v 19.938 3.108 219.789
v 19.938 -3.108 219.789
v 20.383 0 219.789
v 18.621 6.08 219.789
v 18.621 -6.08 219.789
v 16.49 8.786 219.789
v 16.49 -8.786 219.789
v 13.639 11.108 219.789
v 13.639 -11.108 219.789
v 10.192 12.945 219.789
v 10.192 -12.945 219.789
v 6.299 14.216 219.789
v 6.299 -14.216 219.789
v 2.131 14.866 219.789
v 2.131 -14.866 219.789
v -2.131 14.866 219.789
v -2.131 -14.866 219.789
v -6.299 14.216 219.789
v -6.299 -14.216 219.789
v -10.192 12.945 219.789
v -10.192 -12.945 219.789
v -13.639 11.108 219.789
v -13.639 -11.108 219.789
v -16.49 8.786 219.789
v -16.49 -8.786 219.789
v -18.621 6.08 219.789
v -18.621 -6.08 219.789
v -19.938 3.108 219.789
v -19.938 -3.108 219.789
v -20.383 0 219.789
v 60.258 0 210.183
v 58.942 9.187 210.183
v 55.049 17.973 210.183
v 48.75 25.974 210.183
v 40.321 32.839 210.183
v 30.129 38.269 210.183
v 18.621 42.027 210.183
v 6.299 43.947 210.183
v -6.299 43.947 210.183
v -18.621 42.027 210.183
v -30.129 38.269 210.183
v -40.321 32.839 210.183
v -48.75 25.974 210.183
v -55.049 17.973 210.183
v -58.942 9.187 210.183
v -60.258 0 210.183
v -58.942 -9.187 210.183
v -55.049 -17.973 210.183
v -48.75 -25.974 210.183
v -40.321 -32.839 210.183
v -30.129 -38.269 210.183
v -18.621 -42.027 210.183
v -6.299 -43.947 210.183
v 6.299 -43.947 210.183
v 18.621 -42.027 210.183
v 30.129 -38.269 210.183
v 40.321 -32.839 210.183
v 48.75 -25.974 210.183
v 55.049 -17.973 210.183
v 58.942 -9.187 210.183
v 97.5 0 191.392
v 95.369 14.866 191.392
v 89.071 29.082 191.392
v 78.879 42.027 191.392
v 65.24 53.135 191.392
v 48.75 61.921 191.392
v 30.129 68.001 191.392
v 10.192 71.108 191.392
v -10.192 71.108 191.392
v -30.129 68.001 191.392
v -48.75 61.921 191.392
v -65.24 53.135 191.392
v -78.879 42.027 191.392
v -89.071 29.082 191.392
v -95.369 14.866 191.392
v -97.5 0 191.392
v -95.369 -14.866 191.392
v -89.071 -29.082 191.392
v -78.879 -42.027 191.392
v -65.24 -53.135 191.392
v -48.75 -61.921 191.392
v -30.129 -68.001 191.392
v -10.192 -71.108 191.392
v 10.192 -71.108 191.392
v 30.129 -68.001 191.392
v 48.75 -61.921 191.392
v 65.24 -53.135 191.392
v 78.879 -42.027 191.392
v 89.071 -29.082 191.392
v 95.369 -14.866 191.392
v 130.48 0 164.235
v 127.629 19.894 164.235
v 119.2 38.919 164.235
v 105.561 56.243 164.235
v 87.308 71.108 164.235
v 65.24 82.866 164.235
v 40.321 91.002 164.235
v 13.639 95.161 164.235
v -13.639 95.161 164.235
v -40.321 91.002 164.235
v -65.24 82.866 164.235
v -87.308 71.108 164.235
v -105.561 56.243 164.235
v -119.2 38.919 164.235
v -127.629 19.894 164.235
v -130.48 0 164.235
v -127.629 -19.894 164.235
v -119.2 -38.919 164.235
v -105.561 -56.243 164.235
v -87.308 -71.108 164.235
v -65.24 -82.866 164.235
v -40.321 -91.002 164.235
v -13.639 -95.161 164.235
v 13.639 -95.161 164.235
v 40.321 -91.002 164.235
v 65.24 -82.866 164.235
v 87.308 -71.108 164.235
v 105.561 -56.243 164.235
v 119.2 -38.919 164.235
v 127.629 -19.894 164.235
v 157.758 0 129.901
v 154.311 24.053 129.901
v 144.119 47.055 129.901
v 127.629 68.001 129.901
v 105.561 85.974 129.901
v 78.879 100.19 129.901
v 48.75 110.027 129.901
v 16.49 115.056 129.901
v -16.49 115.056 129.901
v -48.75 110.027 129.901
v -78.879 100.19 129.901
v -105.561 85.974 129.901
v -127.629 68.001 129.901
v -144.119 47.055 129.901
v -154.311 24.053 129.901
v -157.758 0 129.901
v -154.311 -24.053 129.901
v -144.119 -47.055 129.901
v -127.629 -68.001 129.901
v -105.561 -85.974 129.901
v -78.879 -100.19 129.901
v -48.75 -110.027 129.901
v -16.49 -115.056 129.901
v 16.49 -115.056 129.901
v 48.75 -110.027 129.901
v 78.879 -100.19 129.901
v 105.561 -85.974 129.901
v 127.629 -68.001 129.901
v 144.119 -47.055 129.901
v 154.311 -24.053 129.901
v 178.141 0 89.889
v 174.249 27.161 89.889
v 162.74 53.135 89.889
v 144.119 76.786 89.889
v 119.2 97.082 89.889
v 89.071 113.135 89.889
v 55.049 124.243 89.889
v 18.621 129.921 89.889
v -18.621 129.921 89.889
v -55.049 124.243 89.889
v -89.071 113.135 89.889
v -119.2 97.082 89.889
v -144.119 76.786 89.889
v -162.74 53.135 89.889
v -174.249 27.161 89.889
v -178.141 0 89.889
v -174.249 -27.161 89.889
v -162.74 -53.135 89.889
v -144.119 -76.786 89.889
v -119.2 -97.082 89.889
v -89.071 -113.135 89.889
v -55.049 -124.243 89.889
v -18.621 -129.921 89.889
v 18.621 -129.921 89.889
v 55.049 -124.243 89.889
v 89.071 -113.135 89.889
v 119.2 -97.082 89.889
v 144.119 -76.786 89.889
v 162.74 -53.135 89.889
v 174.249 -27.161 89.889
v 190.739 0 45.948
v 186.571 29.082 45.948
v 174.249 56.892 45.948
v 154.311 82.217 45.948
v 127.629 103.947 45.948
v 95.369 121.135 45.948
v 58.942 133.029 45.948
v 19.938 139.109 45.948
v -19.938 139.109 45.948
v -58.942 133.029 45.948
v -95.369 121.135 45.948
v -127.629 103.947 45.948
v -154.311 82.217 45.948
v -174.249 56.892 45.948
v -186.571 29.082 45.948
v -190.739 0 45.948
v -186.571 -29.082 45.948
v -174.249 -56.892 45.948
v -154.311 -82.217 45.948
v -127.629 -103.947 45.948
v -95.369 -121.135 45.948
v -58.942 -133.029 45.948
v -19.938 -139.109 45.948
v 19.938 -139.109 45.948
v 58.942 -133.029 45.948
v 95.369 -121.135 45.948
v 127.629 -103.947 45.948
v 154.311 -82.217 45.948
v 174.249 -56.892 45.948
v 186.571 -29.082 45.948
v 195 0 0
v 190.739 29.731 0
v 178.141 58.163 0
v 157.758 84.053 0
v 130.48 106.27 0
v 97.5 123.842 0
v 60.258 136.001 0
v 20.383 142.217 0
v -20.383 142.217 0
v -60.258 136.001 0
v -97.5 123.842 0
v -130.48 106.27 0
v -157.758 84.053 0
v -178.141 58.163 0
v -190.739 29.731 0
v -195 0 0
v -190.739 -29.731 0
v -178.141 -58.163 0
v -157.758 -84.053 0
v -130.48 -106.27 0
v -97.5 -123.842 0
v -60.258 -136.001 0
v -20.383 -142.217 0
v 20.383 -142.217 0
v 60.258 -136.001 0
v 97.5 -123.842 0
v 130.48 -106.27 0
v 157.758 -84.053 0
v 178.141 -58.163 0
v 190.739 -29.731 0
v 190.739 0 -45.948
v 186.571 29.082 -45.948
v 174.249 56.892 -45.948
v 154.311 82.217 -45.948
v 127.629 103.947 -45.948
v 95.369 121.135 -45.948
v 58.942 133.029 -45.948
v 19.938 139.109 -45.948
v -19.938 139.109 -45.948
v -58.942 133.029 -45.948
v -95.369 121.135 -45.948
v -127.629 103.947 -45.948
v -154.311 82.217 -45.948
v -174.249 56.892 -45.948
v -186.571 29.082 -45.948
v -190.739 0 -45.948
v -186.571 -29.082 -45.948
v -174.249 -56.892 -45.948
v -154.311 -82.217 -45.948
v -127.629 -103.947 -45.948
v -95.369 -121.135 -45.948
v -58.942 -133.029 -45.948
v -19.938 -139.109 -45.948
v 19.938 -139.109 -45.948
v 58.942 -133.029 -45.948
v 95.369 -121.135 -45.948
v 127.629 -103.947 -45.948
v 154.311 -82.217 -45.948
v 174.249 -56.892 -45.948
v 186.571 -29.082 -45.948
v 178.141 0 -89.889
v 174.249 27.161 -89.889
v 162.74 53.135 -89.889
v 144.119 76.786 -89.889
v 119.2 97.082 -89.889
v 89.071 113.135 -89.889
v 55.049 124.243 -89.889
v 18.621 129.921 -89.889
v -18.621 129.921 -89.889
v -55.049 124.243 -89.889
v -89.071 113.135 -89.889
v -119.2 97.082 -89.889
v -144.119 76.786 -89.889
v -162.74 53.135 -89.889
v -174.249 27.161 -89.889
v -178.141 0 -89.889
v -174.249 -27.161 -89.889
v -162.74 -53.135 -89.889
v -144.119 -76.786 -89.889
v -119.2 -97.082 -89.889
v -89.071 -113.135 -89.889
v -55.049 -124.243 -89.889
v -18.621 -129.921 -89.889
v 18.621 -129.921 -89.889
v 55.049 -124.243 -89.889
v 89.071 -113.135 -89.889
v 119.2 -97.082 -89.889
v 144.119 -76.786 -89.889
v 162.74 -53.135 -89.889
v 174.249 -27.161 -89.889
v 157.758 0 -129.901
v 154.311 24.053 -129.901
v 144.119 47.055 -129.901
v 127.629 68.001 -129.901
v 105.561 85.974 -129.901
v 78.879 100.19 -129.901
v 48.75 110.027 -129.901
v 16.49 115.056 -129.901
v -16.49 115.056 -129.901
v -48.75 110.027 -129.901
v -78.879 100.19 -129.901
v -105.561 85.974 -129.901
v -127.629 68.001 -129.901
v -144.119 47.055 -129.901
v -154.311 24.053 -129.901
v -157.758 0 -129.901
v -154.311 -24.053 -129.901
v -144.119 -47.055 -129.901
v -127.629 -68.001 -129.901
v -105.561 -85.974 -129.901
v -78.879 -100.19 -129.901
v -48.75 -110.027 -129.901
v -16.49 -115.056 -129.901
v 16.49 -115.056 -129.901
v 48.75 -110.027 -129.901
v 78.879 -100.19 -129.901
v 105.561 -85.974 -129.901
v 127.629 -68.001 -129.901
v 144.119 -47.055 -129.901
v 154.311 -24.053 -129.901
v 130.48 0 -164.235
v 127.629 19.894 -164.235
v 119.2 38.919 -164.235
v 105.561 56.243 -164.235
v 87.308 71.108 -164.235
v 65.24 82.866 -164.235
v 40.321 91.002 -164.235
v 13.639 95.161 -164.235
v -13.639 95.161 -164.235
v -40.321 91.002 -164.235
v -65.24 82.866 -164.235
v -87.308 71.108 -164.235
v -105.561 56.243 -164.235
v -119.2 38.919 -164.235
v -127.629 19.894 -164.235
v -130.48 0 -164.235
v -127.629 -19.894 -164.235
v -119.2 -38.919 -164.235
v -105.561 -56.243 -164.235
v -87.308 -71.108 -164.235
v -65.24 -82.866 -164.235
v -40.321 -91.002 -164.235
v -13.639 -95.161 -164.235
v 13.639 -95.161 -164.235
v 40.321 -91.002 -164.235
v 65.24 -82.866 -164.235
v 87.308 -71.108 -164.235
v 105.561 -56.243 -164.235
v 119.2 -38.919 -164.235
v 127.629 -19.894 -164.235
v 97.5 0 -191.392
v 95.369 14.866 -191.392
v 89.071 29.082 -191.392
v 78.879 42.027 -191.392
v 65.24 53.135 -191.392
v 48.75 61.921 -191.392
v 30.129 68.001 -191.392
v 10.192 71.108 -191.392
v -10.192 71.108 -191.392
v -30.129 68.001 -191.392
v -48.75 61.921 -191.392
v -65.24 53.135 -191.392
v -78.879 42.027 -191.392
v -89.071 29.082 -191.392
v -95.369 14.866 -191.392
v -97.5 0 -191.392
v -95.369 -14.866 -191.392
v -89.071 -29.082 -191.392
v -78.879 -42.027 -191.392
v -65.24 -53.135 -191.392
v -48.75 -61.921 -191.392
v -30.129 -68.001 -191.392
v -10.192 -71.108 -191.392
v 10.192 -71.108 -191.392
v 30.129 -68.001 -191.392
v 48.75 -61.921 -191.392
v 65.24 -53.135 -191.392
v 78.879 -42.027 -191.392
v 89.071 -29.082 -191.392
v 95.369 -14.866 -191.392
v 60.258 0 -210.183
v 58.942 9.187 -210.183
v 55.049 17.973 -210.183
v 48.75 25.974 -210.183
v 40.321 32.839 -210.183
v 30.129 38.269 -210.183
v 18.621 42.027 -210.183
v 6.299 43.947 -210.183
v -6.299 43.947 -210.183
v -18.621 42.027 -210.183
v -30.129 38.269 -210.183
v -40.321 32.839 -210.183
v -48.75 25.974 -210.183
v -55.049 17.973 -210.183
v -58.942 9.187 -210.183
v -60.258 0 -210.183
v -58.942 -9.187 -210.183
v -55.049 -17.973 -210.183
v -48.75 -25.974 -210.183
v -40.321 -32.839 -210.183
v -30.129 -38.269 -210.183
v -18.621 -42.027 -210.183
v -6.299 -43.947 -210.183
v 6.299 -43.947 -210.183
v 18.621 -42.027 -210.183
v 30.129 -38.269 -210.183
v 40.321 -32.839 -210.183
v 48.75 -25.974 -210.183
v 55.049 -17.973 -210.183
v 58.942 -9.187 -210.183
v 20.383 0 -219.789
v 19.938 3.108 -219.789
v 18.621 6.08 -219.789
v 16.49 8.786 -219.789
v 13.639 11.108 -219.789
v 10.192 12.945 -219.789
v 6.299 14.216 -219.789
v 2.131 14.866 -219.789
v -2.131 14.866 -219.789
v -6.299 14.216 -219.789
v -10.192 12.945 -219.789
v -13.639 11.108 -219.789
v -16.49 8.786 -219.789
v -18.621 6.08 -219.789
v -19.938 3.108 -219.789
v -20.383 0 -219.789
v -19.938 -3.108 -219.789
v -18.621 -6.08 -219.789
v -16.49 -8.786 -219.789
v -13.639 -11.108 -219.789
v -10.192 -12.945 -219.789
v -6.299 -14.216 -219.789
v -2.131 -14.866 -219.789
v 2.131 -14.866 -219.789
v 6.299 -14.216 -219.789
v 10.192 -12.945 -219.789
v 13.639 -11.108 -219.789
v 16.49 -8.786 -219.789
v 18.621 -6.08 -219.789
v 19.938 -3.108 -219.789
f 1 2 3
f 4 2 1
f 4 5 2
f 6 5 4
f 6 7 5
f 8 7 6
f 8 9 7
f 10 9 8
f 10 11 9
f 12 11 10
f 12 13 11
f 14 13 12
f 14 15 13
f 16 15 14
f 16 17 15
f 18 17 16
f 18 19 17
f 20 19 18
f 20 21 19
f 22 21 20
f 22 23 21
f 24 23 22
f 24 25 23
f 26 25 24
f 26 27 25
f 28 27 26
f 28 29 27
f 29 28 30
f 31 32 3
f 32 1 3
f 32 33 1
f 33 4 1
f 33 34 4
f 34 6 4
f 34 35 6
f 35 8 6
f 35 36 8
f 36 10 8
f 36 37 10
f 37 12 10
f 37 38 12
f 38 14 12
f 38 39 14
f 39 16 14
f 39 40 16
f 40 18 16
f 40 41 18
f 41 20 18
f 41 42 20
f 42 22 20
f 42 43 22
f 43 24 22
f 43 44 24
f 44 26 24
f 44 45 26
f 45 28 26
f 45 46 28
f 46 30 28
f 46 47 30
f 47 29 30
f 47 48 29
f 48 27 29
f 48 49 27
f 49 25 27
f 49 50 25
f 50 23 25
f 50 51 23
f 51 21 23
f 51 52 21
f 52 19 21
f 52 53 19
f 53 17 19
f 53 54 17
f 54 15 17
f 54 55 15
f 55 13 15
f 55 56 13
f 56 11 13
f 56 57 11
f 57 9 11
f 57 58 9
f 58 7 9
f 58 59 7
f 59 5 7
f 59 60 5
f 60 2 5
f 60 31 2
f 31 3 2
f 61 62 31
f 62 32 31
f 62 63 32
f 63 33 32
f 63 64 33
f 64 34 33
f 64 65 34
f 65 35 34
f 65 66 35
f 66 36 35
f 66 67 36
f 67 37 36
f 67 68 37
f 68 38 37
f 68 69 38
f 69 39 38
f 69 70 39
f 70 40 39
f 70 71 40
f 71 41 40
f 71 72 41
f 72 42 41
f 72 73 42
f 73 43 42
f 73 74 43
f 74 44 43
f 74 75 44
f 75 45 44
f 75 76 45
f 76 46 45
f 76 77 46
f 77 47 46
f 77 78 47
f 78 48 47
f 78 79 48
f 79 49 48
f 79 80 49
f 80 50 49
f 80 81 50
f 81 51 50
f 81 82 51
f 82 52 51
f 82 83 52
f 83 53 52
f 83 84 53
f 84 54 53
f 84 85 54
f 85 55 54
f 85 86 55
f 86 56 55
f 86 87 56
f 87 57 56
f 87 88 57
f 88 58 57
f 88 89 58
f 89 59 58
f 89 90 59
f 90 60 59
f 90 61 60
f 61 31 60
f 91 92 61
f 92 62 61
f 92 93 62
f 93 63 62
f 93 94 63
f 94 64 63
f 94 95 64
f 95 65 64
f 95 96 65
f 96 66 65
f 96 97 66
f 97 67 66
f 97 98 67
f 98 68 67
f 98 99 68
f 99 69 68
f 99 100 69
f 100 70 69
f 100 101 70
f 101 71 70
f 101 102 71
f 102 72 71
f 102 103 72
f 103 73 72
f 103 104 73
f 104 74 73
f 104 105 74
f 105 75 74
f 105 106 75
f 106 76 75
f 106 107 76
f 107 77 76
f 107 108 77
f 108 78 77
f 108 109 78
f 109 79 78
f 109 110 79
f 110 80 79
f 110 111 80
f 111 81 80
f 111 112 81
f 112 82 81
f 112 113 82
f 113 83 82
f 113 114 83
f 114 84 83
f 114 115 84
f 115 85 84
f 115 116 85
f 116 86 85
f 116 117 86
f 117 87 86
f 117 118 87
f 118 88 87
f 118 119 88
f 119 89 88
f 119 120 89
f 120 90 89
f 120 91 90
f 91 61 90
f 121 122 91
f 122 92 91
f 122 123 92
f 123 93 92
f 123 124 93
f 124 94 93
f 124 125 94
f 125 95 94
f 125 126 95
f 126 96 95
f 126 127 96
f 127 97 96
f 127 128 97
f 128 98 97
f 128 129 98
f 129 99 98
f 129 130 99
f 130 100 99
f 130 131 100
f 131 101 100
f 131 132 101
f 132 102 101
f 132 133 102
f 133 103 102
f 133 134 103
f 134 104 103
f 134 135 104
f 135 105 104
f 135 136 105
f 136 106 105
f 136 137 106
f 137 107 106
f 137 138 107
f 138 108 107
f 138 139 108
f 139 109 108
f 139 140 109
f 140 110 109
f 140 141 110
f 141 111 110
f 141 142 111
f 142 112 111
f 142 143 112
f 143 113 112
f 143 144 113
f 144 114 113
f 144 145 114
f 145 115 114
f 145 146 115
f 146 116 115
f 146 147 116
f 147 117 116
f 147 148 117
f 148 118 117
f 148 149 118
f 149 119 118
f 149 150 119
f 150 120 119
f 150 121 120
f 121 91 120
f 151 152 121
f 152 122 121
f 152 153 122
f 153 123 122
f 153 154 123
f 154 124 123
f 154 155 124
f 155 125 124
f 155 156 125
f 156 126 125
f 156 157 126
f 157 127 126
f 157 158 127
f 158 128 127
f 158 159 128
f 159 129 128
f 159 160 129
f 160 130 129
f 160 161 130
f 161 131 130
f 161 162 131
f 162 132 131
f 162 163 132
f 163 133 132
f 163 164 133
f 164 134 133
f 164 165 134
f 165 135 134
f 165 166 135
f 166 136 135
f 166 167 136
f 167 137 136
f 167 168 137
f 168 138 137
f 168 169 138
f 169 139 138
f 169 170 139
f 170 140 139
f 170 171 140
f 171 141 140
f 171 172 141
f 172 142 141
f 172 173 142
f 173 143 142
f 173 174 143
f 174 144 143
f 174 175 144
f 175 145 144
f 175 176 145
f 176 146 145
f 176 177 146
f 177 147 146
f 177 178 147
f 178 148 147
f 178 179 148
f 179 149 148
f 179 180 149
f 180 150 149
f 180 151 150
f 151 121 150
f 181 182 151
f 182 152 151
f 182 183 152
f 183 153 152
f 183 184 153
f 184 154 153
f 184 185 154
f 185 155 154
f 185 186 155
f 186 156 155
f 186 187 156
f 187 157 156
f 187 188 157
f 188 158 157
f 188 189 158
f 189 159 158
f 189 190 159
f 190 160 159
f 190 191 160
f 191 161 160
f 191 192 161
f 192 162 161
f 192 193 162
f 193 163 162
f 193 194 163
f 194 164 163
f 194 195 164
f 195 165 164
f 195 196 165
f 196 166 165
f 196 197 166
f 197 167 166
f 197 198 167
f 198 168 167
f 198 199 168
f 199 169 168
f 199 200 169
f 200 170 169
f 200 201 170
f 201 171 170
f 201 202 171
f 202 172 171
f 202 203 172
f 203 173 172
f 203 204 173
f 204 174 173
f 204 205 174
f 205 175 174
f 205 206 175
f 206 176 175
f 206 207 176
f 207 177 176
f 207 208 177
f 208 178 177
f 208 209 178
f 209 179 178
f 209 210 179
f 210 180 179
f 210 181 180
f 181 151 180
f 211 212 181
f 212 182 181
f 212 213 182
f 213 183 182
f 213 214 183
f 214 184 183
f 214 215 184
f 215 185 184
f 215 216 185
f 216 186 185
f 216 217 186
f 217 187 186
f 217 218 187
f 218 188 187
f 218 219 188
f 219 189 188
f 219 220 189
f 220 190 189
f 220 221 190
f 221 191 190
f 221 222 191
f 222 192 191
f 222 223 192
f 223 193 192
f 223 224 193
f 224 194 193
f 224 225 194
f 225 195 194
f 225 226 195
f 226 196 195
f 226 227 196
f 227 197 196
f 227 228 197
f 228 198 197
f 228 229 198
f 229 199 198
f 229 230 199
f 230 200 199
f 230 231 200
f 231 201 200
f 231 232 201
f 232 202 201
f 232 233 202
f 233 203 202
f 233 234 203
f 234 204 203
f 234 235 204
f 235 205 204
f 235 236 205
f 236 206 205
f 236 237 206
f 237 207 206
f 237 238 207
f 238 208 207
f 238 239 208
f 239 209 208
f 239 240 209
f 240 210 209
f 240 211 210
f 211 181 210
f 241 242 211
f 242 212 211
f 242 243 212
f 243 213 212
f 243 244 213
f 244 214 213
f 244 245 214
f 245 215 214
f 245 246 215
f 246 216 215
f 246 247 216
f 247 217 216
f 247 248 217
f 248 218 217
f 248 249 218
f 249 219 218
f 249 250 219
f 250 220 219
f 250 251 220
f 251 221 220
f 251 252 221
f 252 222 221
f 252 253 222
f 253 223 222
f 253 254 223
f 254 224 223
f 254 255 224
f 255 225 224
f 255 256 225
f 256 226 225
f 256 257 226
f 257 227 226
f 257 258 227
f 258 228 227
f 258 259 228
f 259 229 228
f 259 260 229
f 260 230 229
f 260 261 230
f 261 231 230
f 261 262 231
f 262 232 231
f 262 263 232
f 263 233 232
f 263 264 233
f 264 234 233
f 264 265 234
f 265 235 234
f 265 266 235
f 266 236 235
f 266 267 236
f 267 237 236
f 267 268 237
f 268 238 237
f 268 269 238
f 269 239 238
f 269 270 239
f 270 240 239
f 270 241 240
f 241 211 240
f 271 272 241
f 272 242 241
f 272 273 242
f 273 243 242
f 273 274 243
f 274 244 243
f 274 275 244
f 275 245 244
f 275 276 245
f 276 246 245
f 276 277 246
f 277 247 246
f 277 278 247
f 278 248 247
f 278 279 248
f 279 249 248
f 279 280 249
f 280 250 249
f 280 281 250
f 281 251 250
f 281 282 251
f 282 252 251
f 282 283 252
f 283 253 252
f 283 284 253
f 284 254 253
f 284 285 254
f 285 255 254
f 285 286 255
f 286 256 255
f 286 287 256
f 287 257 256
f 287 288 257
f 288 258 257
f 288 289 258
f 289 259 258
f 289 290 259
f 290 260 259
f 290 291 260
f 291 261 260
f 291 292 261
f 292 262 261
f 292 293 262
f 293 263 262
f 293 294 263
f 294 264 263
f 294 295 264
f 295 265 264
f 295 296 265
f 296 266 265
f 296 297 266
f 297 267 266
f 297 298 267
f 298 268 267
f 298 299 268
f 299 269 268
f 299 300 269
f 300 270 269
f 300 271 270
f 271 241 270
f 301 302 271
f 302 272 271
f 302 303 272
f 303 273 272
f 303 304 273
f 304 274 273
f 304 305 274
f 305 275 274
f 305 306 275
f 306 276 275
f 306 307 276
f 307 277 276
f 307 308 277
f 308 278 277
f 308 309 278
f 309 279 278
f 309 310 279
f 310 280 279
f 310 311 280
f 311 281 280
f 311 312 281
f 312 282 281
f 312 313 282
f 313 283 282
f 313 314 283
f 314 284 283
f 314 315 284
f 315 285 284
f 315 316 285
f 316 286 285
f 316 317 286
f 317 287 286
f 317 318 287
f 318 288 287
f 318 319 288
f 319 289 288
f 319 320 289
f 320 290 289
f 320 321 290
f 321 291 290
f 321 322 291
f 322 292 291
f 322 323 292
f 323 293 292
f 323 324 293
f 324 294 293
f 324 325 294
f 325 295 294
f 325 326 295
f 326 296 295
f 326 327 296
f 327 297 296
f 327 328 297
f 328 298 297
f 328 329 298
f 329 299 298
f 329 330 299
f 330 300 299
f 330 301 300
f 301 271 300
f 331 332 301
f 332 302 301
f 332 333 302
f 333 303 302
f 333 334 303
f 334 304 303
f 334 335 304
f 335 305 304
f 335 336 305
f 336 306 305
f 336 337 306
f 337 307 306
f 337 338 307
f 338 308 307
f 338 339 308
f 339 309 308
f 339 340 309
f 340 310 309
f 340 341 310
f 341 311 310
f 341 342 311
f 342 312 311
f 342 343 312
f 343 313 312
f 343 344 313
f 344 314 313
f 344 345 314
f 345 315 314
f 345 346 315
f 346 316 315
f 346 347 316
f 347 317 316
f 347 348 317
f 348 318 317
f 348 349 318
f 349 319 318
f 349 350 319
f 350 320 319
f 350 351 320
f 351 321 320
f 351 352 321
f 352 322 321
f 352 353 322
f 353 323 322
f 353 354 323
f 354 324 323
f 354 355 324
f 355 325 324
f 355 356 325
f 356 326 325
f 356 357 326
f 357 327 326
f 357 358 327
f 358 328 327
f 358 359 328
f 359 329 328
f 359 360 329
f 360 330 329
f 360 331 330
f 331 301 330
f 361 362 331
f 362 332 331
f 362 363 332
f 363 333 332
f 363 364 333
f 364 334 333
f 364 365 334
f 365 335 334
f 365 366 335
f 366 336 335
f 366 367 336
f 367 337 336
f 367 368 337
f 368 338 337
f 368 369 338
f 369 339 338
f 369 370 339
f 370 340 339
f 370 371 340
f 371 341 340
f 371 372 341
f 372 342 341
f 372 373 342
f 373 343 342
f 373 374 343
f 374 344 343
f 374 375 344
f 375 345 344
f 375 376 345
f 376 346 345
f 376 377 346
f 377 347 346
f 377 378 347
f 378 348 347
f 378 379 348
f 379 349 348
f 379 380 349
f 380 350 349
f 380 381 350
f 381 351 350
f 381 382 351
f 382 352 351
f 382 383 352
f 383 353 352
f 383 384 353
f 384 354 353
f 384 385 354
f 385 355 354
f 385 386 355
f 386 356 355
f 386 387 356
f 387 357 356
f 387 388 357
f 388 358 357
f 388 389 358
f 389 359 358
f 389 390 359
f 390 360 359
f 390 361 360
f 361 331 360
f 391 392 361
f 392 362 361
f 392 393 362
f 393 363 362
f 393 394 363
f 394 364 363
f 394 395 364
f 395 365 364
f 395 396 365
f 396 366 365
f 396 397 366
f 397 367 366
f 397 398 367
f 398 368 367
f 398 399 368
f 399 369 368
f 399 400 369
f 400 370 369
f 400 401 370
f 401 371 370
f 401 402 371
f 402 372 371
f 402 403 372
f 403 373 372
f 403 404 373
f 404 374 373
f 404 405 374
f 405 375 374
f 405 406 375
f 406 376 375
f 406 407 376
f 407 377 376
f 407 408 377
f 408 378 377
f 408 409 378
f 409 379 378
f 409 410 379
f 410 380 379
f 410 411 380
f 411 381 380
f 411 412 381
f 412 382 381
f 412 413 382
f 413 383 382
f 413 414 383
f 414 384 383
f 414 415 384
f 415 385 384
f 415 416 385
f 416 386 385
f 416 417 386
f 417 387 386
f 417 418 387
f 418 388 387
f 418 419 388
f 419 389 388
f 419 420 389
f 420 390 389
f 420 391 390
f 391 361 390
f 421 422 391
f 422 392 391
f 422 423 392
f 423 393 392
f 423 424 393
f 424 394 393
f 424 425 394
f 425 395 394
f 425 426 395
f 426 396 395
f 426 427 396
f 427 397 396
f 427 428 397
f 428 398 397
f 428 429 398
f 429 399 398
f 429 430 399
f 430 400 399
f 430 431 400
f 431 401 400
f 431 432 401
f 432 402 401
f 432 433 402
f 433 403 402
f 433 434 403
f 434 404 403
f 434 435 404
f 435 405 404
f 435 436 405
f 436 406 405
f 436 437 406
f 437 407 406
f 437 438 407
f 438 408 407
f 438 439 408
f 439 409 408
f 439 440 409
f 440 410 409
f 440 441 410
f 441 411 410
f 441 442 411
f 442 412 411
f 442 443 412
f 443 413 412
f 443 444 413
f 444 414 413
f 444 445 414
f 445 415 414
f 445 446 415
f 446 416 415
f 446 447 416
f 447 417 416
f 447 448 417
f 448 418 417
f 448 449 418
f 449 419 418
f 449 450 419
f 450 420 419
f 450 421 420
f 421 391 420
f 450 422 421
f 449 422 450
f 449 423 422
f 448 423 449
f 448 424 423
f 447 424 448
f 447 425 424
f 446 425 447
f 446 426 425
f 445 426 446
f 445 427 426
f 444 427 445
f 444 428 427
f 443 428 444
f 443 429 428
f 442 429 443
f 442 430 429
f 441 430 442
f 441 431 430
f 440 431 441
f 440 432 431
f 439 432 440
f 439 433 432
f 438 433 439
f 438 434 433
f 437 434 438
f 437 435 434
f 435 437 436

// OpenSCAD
// Generated by SolidPython 1.0.1 on 2020-07-29 00:46:52


scale(v = [15, 11, 17]) {
	sphere(r = 13);
}
/***********************************************
*********      SolidPython code:      **********
************************************************
 
# import packages: SolidPython
from solid import *
from solid.utils import *
from itertools import chain, combinations, permutations


class Resize:

    def __init__(self, scad_file):
        self.scad_file = scad_file
        #self.scad_file = import_scad(scad_file)
        # cone/cylinder param:
        self.r1 = 0
        self.r2 = 0
        self.h = 0
        # rectangular prism param:
        self.w = 0
        self.l = 0
        # ellipse param:
        self.r = 0

    # import OpenScad code (file name corresponds to shape)


    # classify shape + parameters
    def assign(self, param1, param2, param3):
        if self.scad_file == 'cone.scad':
            self.r1 = param1
            self.r2 = param2
            self.h = param3
        elif self.scad_file == 'cylinder.scad':
            self.r1 = param1
            self.r2 = param2
            self.h = param3
        elif self.scad_file == 'rectangularPrism.scad':
            self.h = param1
            self.l = param2
            self.w = param3
        else:
            self.r = param1
            self.h = param2

    # resize parameters
    def iterate(self):
        x = range(3, 20, 2)
        i = 1
        if self.scad_file == 'cone.scad':
            tempList = list(permutations(x, 2))
            for temp in tempList:
                param1 = temp[0]
                param2 = temp[1]
                filepath = 'produced_scad_files/' + 'cone' + str(param1) + '_' + str(param2) + '_' + '.scad'
                scad_render_to_file(cylinder(h=param1, r1=param2, r2=0), filepath)

        elif self.scad_file == 'cylinder.scad':
            tempList = list(permutations(x, 3))
            for temp in tempList:
                param1 = temp[0]
                param2 = temp[1]
                filepath = 'produced_scad_files/' + 'cylinder' + str(param1) + '_' + str(param2) + '_' + '.scad'
                scad_render_to_file(cylinder(h=param1, r1=param2, r2=param2), filepath)

        elif self.scad_file == 'rectangularPrism.scad':
            tempList = list(permutations(x, 3))
            for temp in tempList:
                param1 = temp[0]
                param2 = temp[1]
                param3 = temp[2]
                filepath = 'produced_scad_files/' + 'rectangularPrism' + str(param1) + '_' + str(param2) + '_' + str(
                    param3) + '.scad'
                scad_render_to_file(cube(size=(param1, param2, param3)), filepath)

        elif self.scad_file == 'ellipse.scad':
            tempList = list(permutations(x, 4))
            for temp in tempList:
                param1 = temp[0]
                param2 = temp[1]
                param3 = temp[2]
                param4 = temp[3]
                filepath = 'produced_scad_files/' + 'ellipse' + str(param1) + '_' + str(param2) + '_' + str(param3) + '_' + str(param4) + '.scad'
                scad_render_to_file(scale([param1, param2, param3])(sphere(r=param4)), filepath)

    def render_to_scadfile(self):
        scad_render_to_file(scad, 'example.scad') 
 
************************************************/
